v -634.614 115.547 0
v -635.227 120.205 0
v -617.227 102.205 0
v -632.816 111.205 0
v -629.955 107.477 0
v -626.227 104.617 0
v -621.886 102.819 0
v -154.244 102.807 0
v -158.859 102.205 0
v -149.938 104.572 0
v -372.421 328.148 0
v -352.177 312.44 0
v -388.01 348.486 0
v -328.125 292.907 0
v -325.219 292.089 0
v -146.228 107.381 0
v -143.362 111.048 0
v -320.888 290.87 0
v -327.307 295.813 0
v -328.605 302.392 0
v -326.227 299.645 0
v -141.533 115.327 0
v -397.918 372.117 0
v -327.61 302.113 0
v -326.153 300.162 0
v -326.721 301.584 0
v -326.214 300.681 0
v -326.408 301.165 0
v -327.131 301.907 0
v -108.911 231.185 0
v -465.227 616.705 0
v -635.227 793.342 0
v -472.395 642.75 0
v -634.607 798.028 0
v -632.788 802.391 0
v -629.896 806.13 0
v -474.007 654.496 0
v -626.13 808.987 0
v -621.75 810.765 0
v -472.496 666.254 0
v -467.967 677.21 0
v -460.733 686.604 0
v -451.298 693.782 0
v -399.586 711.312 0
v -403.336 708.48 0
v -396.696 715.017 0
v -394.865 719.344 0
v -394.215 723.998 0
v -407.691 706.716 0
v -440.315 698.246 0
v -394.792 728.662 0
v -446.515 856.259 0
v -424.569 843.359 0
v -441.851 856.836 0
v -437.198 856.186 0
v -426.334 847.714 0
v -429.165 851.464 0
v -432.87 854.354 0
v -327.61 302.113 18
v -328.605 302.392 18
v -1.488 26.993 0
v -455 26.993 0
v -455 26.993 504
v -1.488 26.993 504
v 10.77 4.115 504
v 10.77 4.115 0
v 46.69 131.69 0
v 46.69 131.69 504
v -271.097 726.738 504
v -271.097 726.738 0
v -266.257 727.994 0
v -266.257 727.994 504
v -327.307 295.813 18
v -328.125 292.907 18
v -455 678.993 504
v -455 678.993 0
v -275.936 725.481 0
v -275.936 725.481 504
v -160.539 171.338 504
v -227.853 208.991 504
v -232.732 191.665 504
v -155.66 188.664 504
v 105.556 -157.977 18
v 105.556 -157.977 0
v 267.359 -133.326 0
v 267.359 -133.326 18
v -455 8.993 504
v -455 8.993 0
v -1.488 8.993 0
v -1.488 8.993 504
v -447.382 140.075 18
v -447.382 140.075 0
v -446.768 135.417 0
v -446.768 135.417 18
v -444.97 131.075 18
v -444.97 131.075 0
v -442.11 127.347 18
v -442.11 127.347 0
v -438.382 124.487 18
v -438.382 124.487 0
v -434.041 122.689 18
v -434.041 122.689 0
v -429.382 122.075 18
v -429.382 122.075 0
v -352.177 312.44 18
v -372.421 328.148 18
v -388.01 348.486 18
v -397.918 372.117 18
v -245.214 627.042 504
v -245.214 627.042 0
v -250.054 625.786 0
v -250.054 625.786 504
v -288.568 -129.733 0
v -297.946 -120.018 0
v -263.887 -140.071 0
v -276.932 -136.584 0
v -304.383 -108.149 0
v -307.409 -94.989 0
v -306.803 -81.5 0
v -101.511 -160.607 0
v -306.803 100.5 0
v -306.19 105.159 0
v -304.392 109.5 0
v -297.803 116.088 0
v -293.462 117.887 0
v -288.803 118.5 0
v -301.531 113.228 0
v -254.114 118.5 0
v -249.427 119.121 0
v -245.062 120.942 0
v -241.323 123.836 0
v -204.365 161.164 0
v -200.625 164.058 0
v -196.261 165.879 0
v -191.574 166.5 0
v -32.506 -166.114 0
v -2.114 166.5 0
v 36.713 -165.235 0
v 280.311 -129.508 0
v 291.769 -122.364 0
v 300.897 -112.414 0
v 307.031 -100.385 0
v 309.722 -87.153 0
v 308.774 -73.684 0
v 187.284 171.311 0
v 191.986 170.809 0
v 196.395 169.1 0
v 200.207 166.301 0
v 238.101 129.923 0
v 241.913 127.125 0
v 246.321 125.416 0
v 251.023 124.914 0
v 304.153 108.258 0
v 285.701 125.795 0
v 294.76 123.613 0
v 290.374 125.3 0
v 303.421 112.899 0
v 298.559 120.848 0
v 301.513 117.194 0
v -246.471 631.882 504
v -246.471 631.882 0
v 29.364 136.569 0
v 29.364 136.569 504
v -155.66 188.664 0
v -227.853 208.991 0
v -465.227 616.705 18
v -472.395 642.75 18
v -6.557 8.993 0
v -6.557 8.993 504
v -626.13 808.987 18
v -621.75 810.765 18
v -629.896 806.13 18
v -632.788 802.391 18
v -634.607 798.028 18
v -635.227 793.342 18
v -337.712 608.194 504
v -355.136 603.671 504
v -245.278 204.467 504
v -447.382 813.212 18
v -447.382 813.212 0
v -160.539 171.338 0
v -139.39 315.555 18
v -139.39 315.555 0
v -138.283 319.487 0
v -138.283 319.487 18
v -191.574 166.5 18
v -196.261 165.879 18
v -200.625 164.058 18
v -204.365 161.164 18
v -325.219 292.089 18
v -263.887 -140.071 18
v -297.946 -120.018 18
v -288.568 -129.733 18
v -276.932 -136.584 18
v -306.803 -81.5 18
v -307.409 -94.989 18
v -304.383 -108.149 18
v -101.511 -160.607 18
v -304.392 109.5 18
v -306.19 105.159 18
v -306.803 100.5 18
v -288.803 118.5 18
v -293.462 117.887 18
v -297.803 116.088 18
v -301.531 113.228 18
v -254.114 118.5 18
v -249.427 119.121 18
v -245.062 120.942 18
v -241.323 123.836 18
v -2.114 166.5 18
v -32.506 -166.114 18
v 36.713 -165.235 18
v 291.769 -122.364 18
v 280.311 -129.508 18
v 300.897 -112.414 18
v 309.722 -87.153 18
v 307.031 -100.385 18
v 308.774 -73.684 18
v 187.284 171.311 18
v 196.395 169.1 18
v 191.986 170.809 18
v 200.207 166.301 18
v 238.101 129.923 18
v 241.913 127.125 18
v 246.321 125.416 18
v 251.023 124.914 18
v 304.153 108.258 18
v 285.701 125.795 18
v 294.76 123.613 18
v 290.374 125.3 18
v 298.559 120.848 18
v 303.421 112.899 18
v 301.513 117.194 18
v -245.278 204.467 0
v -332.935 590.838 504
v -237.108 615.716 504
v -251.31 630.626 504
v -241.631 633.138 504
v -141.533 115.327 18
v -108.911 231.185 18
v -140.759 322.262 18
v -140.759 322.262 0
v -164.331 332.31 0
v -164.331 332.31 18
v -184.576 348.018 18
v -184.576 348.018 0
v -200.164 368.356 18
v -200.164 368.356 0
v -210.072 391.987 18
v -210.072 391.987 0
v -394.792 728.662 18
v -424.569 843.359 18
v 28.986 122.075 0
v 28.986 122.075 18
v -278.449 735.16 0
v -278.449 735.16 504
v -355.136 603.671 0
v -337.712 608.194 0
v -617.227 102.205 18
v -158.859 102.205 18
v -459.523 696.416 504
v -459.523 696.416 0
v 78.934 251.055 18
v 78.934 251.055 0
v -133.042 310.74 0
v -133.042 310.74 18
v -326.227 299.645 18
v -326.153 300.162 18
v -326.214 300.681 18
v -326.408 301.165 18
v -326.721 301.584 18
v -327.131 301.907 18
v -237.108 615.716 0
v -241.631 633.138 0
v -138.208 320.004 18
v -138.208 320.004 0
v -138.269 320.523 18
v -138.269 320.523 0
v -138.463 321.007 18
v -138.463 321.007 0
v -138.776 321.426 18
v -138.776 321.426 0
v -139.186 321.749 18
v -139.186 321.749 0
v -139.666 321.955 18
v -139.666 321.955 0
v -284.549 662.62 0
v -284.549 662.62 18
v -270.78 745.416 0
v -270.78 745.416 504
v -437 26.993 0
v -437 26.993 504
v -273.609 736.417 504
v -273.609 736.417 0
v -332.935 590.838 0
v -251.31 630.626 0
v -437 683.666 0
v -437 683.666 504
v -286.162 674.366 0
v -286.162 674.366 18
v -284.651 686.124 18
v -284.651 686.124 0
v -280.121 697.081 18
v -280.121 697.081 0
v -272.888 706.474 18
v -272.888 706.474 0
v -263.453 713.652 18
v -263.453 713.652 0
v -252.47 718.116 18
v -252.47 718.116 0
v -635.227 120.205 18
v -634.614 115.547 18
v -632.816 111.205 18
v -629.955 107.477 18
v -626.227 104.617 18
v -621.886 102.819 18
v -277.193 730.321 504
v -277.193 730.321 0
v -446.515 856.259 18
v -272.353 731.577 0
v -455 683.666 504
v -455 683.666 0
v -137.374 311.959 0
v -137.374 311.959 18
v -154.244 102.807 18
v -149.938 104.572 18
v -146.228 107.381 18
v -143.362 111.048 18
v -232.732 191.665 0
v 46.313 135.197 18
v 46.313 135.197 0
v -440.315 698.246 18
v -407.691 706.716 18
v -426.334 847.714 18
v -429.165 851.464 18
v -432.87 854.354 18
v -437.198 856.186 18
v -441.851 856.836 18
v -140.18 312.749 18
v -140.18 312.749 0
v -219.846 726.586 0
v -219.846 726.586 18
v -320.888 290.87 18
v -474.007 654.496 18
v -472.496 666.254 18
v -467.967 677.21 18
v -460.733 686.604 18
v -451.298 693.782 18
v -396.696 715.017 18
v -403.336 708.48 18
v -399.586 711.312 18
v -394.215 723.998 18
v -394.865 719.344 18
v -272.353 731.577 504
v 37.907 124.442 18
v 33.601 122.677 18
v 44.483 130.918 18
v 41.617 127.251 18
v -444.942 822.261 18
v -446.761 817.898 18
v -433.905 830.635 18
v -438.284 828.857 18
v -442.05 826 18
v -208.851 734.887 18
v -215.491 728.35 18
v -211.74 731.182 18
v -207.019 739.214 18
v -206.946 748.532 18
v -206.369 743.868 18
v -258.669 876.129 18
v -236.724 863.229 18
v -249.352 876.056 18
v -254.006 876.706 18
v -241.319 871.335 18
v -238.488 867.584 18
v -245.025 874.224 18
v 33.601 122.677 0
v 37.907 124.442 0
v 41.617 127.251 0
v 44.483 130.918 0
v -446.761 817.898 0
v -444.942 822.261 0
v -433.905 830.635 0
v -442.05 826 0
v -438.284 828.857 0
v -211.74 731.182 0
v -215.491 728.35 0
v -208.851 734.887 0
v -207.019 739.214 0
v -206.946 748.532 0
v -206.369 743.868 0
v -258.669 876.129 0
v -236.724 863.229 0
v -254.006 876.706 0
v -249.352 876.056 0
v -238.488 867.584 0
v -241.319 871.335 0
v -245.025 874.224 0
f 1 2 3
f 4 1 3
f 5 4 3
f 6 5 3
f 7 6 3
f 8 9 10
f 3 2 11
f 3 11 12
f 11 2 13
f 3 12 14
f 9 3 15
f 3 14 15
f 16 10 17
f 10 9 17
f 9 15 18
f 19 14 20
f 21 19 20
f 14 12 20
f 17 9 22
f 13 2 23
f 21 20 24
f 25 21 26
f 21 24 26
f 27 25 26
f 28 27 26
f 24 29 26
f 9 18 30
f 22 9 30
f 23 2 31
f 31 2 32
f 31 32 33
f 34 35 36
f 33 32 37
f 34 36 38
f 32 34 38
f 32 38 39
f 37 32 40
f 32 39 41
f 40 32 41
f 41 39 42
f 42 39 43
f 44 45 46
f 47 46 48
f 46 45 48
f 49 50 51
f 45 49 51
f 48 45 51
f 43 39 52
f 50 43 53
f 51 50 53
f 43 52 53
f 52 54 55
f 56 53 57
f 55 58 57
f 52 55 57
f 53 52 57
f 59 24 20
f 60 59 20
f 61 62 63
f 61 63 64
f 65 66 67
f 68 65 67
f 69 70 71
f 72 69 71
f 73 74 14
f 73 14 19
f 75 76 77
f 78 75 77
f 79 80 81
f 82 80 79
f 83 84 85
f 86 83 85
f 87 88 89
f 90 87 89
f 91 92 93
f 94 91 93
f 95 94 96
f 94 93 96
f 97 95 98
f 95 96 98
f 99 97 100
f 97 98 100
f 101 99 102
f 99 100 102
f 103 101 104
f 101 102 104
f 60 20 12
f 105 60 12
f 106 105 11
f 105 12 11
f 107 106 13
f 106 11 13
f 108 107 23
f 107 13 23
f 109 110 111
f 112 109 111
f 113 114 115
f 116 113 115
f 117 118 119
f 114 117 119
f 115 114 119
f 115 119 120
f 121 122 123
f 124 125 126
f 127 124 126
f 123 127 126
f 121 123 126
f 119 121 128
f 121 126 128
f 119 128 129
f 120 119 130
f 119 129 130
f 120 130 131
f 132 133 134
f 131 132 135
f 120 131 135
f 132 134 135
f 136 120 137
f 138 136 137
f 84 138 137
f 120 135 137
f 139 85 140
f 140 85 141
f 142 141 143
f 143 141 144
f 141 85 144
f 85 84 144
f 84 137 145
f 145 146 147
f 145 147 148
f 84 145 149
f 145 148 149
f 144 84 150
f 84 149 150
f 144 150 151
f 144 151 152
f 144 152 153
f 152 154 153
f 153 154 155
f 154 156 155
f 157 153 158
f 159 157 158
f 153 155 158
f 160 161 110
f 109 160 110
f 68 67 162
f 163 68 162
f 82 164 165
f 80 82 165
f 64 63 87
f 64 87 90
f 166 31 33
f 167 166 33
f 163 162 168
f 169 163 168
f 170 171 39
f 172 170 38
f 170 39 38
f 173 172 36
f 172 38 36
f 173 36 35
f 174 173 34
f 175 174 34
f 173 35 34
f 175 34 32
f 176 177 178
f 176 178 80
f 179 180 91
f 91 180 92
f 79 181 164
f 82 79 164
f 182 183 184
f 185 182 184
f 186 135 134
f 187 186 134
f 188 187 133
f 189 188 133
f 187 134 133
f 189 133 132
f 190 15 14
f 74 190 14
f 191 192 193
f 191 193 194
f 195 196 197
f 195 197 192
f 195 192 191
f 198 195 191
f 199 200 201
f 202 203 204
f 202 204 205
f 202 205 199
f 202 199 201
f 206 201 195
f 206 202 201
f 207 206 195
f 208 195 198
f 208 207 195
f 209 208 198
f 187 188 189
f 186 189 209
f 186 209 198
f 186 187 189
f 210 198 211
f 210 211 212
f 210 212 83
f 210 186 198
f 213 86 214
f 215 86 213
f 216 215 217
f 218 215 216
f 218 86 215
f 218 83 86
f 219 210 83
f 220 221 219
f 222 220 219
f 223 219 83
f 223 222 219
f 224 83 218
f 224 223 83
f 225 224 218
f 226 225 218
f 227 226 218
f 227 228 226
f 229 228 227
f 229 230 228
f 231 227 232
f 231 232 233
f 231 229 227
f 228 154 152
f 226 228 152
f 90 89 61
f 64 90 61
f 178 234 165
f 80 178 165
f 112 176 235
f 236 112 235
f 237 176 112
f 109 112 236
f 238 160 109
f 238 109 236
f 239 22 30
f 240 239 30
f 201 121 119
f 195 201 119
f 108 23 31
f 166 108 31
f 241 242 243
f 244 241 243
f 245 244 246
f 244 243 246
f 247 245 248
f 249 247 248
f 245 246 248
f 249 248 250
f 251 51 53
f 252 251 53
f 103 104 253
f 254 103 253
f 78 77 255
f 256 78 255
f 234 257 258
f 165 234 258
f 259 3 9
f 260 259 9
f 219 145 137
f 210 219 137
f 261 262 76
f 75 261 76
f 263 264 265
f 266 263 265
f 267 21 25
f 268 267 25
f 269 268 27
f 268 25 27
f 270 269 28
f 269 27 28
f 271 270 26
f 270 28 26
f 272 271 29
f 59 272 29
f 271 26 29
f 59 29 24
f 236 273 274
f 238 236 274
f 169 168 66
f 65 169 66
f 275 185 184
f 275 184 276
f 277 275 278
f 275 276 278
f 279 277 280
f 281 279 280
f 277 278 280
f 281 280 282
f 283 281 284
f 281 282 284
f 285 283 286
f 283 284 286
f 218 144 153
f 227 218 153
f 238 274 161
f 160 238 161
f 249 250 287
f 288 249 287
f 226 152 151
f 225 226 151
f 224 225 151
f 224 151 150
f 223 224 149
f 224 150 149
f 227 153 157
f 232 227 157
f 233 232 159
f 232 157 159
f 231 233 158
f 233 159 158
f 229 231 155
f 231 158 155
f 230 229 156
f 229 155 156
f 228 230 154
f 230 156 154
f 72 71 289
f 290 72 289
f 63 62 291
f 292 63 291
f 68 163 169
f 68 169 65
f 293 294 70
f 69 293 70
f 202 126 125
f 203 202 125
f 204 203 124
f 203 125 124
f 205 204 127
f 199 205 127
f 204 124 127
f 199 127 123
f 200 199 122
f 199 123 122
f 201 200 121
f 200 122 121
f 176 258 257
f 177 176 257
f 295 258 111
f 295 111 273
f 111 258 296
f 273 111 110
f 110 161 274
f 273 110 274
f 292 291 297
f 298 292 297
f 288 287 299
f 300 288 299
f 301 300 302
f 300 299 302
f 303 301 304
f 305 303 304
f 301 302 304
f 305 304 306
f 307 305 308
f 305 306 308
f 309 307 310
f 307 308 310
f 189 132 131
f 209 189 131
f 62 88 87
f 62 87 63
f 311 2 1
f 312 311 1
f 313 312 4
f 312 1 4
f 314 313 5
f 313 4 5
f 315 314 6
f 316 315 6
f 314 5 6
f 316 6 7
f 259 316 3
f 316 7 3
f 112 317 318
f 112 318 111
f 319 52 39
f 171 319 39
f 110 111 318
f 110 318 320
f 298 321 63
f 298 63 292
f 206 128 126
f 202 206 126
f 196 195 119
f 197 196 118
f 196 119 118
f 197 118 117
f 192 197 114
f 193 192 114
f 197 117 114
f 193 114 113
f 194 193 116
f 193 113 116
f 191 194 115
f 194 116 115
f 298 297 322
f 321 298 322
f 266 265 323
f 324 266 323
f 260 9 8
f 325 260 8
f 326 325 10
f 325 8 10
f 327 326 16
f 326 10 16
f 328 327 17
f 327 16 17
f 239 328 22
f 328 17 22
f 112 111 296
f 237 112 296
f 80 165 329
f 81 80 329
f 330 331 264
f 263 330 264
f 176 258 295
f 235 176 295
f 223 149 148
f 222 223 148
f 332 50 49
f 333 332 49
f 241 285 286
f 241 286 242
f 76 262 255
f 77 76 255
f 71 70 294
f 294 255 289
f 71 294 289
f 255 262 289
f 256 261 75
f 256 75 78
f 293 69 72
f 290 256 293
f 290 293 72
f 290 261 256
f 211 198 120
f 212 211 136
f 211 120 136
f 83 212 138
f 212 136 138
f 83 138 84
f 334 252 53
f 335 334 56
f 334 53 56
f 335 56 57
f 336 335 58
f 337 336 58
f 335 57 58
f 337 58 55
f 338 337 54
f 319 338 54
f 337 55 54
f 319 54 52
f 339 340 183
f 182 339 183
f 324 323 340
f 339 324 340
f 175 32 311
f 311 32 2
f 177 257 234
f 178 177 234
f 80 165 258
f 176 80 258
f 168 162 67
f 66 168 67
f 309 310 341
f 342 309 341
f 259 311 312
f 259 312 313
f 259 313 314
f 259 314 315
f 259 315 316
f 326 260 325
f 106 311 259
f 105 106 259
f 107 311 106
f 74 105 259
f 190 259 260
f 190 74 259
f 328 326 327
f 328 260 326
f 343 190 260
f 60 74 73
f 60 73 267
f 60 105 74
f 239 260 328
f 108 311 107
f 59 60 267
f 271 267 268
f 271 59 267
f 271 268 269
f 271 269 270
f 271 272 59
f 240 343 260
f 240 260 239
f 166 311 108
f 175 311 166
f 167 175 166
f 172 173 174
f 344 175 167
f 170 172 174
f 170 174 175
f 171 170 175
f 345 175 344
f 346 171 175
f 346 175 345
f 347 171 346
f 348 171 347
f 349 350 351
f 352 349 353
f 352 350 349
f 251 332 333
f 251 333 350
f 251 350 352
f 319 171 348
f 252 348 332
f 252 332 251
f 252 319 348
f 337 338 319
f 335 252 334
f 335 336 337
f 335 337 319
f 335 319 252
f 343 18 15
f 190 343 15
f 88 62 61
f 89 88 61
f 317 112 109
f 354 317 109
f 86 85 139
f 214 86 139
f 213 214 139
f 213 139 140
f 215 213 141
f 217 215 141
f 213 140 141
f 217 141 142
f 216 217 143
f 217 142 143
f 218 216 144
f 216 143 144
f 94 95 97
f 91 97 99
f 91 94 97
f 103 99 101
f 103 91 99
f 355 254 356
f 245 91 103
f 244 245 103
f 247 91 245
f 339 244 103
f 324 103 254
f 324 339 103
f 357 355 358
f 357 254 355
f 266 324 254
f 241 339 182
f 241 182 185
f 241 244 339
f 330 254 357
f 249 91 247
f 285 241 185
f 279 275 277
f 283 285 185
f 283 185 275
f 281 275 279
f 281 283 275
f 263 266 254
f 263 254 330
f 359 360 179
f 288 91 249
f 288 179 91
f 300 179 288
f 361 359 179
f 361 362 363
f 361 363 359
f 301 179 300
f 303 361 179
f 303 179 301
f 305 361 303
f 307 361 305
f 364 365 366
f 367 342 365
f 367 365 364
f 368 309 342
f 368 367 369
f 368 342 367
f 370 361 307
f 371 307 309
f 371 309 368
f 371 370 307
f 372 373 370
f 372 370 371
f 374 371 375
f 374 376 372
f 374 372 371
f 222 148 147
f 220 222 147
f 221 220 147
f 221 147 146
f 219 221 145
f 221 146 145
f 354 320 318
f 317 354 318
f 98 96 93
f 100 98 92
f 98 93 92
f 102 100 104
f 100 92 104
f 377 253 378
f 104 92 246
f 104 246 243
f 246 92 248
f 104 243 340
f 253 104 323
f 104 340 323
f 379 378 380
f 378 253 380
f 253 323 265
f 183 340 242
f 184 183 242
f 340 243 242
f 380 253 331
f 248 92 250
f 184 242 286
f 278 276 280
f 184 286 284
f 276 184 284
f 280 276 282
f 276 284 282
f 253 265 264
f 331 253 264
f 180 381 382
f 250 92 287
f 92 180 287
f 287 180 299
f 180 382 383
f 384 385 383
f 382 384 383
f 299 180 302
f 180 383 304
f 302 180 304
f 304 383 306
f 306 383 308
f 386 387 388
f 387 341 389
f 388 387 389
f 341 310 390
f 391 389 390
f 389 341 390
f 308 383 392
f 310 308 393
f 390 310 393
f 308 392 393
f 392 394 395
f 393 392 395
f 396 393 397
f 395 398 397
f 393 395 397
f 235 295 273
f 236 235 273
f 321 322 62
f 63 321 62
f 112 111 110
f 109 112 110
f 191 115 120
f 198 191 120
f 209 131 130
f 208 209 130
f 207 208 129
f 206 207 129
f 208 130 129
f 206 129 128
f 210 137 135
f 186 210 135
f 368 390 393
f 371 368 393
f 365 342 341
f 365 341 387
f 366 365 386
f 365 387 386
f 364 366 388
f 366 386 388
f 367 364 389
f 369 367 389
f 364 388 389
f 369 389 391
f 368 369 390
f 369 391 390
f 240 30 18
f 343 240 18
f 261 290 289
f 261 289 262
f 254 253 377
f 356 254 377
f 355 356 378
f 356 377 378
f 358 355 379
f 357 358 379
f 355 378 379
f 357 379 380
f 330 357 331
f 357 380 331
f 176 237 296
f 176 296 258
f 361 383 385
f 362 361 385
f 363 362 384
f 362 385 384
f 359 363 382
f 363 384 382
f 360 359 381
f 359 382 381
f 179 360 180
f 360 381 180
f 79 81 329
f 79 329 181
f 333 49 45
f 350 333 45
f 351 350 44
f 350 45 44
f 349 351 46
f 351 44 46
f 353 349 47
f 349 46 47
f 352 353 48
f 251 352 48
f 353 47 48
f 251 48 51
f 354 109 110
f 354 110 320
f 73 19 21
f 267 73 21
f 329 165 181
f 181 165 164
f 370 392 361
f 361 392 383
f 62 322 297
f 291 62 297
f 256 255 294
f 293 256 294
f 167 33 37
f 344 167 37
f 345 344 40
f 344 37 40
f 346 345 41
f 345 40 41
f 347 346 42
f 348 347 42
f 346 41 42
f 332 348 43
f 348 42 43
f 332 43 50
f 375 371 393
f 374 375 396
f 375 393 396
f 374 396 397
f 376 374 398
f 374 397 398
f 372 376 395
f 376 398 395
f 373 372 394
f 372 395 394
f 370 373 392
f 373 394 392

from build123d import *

# Parameters (mm, degrees)
F12_DEPTH = 18
F13_DEPTH = 504
F4_W      = 453.5115820138
F4_H      = 18


with BuildPart() as f12:
    # F9 (on Top) → F12 (new body)
    with BuildSketch(Plane.XY):
        with BuildLine():
            Line((-429.3817631771, 122.0754157483), (28.9864571738, 122.0754157483))
            ThreePointArc((28.9864571738, 122.0754157483), (39.8535736292, 125.7259983405), (46.3127671781, 135.1969957544))
            Line((46.3127671781, 135.1969957544), (78.9340205229, 251.0553984518))
            Line((78.9340205229, 251.0553984518), (-133.042143326, 310.7397025937))
            Line((-133.042143326, 310.7397025937), (-137.3737208271, 311.9593075922))
            Line((-137.3737208271, 311.9593075922), (-140.1796967751, 312.749362091))
            Line((-140.1796967751, 312.749362091), (-139.3896422763, 315.555338039))
            Line((-139.3896422763, 315.555338039), (-138.2825334442, 319.4873715371))
            ThreePointArc((-138.2825334442, 319.4873715371), (-138.4631106495, 321.0074168073), (-139.6656323342, 321.9545637591))
            Line((-139.6656323342, 321.9545637591), (-140.7590331261, 322.2624232101))
            ThreePointArc((-140.7590331261, 322.2624232101), (-184.576005593, 348.018267908), (-210.0724603784, 391.9866816348))
            Line((-210.0724603784, 391.9866816348), (-241.8817631771, 507.5754157483))
            Line((-241.8817631771, 507.5754157483), (-277.3817631771, 636.5754157483))
            Line((-277.3817631771, 636.5754157483), (-284.5491614764, 662.6203278781))
            ThreePointArc((-284.5491614764, 662.6203278781), (-280.1214549097, 697.0805388885), (-252.4699002319, 718.1162763898))
            Line((-252.4699002319, 718.1162763898), (-219.8457280188, 726.5860134067))
            ThreePointArc((-219.8457280188, 726.5860134067), (-208.8510002454, 734.8872643352), (-206.9464245034, 748.5315817251))
            Line((-206.9464245034, 748.5315817251), (-236.7237128133, 863.2292848446))
            ThreePointArc((-236.7237128133, 863.2292848446), (-245.0249637419, 874.2240126181), (-258.6692811317, 876.12858836))
            Line((-258.6692811317, 876.12858836), (-433.9048955786, 830.6347269171))
            ThreePointArc((-433.9048955786, 830.6347269171), (-443.6193258763, 824.2255470304), (-447.3817631771, 813.2122910002))
            Line((-447.3817631771, 813.2122910002), (-447.3817631771, 630.5646466931))
            Line((-447.3817631771, 630.5646466931), (-447.3817631771, 501.5646466931))
            Line((-447.3817631771, 501.5646466931), (-447.3817631771, 297.5646466931))
            Line((-447.3817631771, 297.5646466931), (-447.3817631771, 140.0754157483))
            ThreePointArc((-447.3817631771, 140.0754157483), (-442.1096852384, 127.347493687), (-429.3817631771, 122.0754157483))
        make_face()
    extrude(amount=F12_DEPTH)


with BuildPart() as f12b:
    # F10 (on Top) → F12, piece 2 (new body)
    with BuildSketch(Plane.XY):
        with BuildLine():
            Line((-617.2272465994, 102.2053729474), (-158.8590262485, 102.2053729474))
            ThreePointArc((-158.8590262485, 102.2053729474), (-147.9919097931, 105.8559555396), (-141.5327162442, 115.3269529535))
            Line((-141.5327162442, 115.3269529535), (-108.9114628994, 231.1853556509))
            Line((-108.9114628994, 231.1853556509), (-320.8876267483, 290.8696597928))
            Line((-320.8876267483, 290.8696597928), (-325.2192042494, 292.0892647913))
            Line((-325.2192042494, 292.0892647913), (-328.1245565168, 292.9072998251))
            Line((-328.1245565168, 292.9072998251), (-327.3065214829, 295.8126520925))
            Line((-327.3065214829, 295.8126520925), (-326.2273931858, 299.6453092712))
            ThreePointArc((-326.2273931858, 299.6453092712), (-326.4079703912, 301.1653545414), (-327.6104920759, 302.1125014932))
            Line((-327.6104920759, 302.1125014932), (-328.6045165484, 302.3923804091))
            ThreePointArc((-328.6045165484, 302.3923804091), (-372.4214890153, 328.1482251071), (-397.9179438007, 372.1166388339))
            Line((-397.9179438007, 372.1166388339), (-429.7272465994, 487.7053729474))
            Line((-429.7272465994, 487.7053729474), (-465.2272465994, 616.7053729474))
            Line((-465.2272465994, 616.7053729474), (-472.3946448986, 642.7502850772))
            ThreePointArc((-472.3946448986, 642.7502850772), (-467.966938332, 677.2104960876), (-440.3153836541, 698.2462335889))
            Line((-440.3153836541, 698.2462335889), (-407.6912114411, 706.7159706058))
            ThreePointArc((-407.6912114411, 706.7159706058), (-396.6964836677, 715.0172215343), (-394.7919079257, 728.6615389242))
            Line((-394.7919079257, 728.6615389242), (-424.5691962356, 843.3592420437))
            ThreePointArc((-424.5691962356, 843.3592420437), (-432.8704471642, 854.3539698172), (-446.514764554, 856.2585455591))
            Line((-446.514764554, 856.2585455591), (-621.7503790009, 810.7646841162))
            ThreePointArc((-621.7503790009, 810.7646841162), (-631.4648092986, 804.3555042295), (-635.2272465994, 793.3422481993))
            Line((-635.2272465994, 793.3422481993), (-635.2272465994, 610.6946038922))
            Line((-635.2272465994, 610.6946038922), (-635.2272465994, 481.6946038922))
            Line((-635.2272465994, 481.6946038922), (-635.2272465994, 277.6946038922))
            Line((-635.2272465994, 277.6946038922), (-635.2272465994, 120.2053729474))
            ThreePointArc((-635.2272465994, 120.2053729474), (-629.9551686607, 107.4774508861), (-617.2272465994, 102.2053729474))
        make_face()
    extrude(amount=F12_DEPTH)


with BuildPart() as f12c:
    # F11 (on Top) → F12, piece 3 (new body)
    with BuildSketch(Plane.XY):
        with BuildLine():
            Line((-2.114153737, 166.5), (-191.5736835543, 166.5))
            ThreePointArc((-191.5736835543, 166.5), (-198.5034431957, 165.112598572), (-204.3649407901, 161.1642701459))
            Line((-204.3649407901, 161.1642701459), (-241.3228965013, 123.8357298541))
            ThreePointArc((-241.3228965013, 123.8357298541), (-247.1843940957, 119.887401428), (-254.114153737, 118.5))
            Line((-254.114153737, 118.5), (-288.8032333315, 118.5))
            ThreePointArc((-288.8032333315, 118.5), (-301.5311553929, 113.2279220614), (-306.8032333315, 100.5))
            Line((-306.8032333315, 100.5), (-306.8032333315, -81.5))
            ThreePointArc((-306.8032333315, -81.5), (-297.9458808392, -120.018294448), (-263.8872117477, -140.0711934921))
            Line((-263.8872117477, -140.0711934921), (-101.5105416408, -160.6067478645))
            ThreePointArc((-101.5105416408, -160.6067478645), (2.1138129142, -166.4731585248), (105.5558033474, -157.9774980923))
            Line((105.5558033474, -157.9774980923), (267.3587007934, -133.3256347457))
            ThreePointArc((267.3587007934, -133.3256347457), (300.8972230342, -112.4144122501), (308.7736962041, -73.683638042))
            Line((308.7736962041, -73.683638042), (304.152507581, 108.2576838607))
            ThreePointArc((304.152507581, 108.2576838607), (298.5589528669, 120.8476382471), (285.7012702762, 125.7948398994))
            Line((285.7012702762, 125.7948398994), (251.0233746882, 124.914044405))
            ThreePointArc((251.0233746882, 124.914044405), (244.0606215382, 126.1250439842), (238.1007611478, 129.9232692982))
            Line((238.1007611478, 129.9232692982), (200.2069065179, 166.3013697428))
            ThreePointArc((200.2069065179, 166.3013697428), (194.2470461275, 170.0995950568), (187.2842929774, 171.310594636))
            Line((187.2842929774, 171.310594636), (-2.114153737, 166.5))
        make_face()
    extrude(amount=F12_DEPTH)


with BuildPart() as f13:
    # F2 (on Top) → F13 (new body)
    with BuildSketch(Plane.XY):
        Polygon((-271.0965097661, 726.7375479236), (-266.2569442336, 727.9939735907), (-270.7800766351, 745.4164095076), (-459.5231324015, 696.4158084913), (-455, 678.9933725744), (-275.9360752985, 725.4811222565), (-278.4489266327, 735.1602533215), (-273.6093611002, 736.4166789886), align=None)
    extrude(amount=F13_DEPTH)


with BuildPart() as f13b:
    # F1 (on Top) → F13, piece 2 (new body)
    with BuildSketch(Plane.XY):
        Polygon((-155.660380149, 188.6642868454), (-227.8533385, 208.9910368199), (-232.7317584939, 191.6647268157), (-160.5388001429, 171.3379768411), align=None)
    extrude(amount=F13_DEPTH)


with BuildPart() as f13c:
    # F4 (on Top) → F13, piece 3 (new body)
    with BuildSketch(Plane.XY):
        with Locations((-228.2442089931, 17.9933725744)):
            Rectangle(F4_W, F4_H)
    extrude(amount=F13_DEPTH)


with BuildPart() as f13d:
    # F3 (on Top) → F13, piece 4 (new body)
    with BuildSketch(Plane.XY):
        Polygon((-337.7116489579, 608.1944748218), (-332.9352006771, 590.8378036043), (-237.1078687572, 615.7160532374), (-241.6310011587, 633.1384891543), (-246.4705666912, 631.8820634872), (-245.2141410241, 627.0424979547), (-250.0537065566, 625.7860722876), (-251.3101322237, 630.6256378201), align=None)
    extrude(amount=F13_DEPTH)


with BuildPart() as f13e:
    # F5 (on Top) → F13, piece 5 (new body)
    with BuildSketch(Plane.XY):
        Polygon((-337.7116489579, 608.1944748218), (-355.1359263378, 603.6708643482), (-245.2776158799, 204.4674263463), (-227.8533385, 208.9910368199), align=None)
    extrude(amount=F13_DEPTH)


with BuildPart() as f13f:
    # F6 (on Top) → F13, piece 6 (new body)
    with BuildSketch(Plane.XY):
        Polygon((-437, 678.9933725744), (-437, 683.6664494975), (-455, 683.6664494975), (-455, 26.9933725744), (-437, 26.9933725744), align=None)
    extrude(amount=F13_DEPTH)


with BuildPart() as f13g:
    # F7 (on Top) → F13, piece 7 (new body)
    with BuildSketch(Plane.XY):
        Polygon((46.6900559198, 131.6902160334), (29.3637459156, 136.5686360273), (-6.5565230743, 8.9933725744), (10.7697869299, 4.1149525805), align=None)
    extrude(amount=F13_DEPTH)


with BuildPart() as f13h:
    # F8 (on Top) → F13, piece 8 (new body)
    with BuildSketch(Plane.XY):
        Polygon((-277.1925009656, 730.320687789), (-250.0537065566, 625.7860722876), (-245.2141410241, 627.0424979547), (-272.3529354331, 731.5771134561), align=None)
    extrude(amount=F13_DEPTH)


solid = Compound([f12.part, f12b.part, f12c.part, f13.part, f13b.part, f13c.part, f13d.part, f13e.part, f13f.part, f13g.part, f13h.part])
